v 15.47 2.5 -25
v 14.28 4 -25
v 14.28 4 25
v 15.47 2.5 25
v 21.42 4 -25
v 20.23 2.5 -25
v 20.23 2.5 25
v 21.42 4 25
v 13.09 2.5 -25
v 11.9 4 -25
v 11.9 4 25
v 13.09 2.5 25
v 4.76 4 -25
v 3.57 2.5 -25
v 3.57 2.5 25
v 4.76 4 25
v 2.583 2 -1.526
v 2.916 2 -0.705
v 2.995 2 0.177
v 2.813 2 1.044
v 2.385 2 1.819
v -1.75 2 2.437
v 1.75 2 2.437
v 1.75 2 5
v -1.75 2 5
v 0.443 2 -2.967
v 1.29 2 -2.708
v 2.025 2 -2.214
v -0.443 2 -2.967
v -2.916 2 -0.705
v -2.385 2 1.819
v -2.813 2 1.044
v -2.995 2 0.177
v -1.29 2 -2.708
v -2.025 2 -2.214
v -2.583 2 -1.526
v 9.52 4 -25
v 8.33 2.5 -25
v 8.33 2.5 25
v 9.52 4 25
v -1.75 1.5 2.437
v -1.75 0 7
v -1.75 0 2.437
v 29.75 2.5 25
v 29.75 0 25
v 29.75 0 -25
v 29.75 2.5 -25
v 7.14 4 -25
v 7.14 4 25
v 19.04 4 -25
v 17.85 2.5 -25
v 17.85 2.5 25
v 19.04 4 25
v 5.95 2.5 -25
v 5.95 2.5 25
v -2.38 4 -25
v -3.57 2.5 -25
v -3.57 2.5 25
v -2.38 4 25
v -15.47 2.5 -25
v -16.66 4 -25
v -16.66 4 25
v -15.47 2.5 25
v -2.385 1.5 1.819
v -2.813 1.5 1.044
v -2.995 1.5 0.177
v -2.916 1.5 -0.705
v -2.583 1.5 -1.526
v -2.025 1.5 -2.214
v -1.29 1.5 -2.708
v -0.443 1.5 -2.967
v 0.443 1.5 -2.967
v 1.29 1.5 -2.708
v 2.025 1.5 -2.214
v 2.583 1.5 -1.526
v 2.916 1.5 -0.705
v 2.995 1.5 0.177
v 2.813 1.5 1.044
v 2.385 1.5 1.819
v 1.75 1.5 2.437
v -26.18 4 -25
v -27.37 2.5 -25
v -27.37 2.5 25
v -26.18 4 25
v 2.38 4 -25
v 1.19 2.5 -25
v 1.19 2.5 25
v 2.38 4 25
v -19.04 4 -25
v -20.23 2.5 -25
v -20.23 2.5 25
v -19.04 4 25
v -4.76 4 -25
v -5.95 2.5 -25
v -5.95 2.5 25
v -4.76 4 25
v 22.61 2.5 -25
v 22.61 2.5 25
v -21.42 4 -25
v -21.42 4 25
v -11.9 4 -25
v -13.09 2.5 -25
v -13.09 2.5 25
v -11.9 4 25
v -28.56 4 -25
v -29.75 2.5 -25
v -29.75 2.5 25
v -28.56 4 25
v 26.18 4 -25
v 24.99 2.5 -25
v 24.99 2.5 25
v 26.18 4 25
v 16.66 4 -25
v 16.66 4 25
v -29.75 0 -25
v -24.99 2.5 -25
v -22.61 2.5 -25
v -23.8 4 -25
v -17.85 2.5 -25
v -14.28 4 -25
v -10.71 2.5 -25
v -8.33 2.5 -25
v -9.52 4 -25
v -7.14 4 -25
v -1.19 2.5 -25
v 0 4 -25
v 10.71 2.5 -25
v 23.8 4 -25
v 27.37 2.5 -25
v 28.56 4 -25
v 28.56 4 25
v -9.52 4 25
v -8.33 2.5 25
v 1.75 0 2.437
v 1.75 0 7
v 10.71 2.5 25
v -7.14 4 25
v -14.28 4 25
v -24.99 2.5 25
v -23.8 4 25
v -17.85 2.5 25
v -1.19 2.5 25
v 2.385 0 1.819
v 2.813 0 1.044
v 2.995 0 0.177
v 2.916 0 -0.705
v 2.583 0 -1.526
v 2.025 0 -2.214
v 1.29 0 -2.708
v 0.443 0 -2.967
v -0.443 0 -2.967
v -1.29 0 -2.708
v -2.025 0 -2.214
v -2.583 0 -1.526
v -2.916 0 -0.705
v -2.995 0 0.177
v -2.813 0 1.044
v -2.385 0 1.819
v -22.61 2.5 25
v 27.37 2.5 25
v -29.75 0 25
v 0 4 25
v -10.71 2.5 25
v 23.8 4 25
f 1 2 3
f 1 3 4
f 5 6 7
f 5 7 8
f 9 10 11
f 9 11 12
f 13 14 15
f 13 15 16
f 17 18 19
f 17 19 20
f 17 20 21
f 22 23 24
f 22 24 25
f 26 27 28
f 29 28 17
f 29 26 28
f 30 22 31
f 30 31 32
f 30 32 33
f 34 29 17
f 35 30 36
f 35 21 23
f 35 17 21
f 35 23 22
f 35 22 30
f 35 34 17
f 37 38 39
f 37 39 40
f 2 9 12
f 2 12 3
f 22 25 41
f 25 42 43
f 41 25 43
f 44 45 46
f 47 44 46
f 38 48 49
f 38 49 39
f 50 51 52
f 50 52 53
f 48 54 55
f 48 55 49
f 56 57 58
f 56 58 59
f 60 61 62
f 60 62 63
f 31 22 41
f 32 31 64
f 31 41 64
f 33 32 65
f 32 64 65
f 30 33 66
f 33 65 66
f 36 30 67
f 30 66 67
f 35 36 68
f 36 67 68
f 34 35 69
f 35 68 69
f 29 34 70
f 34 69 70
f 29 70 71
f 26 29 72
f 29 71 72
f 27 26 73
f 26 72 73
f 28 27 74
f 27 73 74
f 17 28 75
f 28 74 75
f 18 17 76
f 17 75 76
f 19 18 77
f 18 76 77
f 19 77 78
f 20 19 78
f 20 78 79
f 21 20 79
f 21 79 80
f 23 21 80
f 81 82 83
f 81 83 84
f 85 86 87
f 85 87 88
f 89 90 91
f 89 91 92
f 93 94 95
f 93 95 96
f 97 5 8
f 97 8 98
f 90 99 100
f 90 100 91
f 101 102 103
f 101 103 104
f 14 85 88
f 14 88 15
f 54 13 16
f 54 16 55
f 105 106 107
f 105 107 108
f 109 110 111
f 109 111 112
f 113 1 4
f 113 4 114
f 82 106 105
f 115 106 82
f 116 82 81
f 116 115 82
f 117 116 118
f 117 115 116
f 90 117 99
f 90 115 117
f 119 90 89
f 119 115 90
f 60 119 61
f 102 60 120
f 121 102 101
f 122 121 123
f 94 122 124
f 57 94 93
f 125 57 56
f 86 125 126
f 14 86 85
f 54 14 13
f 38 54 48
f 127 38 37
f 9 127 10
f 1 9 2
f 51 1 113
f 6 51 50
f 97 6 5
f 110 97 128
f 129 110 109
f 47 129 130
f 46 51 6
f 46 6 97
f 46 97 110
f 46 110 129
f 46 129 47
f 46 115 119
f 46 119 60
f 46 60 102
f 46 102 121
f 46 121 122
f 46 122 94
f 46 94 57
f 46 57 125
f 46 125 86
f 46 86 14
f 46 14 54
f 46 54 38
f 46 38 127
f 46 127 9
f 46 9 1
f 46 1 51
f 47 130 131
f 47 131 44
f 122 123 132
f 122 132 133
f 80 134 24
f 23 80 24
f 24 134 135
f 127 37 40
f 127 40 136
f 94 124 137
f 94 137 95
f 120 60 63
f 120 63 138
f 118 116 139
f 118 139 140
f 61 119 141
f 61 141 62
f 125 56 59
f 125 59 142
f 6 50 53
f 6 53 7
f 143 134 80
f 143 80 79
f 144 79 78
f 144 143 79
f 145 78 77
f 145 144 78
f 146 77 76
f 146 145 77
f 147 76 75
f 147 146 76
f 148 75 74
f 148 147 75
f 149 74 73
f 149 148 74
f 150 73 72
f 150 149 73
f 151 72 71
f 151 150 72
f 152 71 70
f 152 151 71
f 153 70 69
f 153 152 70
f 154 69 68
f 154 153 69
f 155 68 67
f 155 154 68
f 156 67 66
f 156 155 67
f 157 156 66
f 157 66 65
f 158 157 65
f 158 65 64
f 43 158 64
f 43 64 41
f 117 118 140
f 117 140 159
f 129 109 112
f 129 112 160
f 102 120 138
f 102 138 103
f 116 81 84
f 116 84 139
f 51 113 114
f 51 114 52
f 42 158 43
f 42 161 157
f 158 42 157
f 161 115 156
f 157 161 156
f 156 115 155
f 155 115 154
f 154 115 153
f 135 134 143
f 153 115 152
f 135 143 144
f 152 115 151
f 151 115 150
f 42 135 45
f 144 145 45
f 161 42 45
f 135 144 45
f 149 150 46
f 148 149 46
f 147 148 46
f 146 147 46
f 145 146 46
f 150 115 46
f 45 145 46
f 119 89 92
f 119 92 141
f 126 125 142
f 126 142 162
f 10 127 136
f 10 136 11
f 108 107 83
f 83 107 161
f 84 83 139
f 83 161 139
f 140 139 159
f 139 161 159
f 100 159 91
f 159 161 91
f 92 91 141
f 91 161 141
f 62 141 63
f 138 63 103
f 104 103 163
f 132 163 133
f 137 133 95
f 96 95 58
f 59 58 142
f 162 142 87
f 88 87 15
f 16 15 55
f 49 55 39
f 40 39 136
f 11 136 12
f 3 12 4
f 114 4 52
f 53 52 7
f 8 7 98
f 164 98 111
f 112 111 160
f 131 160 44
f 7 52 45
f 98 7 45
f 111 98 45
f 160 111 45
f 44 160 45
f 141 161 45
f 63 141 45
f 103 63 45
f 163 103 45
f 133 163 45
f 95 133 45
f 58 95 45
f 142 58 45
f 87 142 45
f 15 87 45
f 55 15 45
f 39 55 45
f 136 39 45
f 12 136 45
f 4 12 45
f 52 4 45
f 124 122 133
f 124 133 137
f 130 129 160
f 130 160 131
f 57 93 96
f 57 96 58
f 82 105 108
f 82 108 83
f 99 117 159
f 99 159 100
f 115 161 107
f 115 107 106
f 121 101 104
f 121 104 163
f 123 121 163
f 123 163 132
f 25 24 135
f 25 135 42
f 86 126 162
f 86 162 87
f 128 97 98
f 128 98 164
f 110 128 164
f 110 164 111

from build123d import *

# Parameters (mm, degrees)
SKETCH1_W           = 59.5
SKETCH1_H           = 50
SKETCH1_R           = 3
BOSS_EXTRUDE1_DEPTH = 1.5
BOSS_EXTRUDE2_DEPTH = 50
CUT_EXTRUDE1_DEPTH  = 2
CHAMFER1_SIZE       = 2


with BuildPart() as part:
    # Sketch1 → Boss-Extrude1 (new body)
    with BuildSketch(Plane(origin=(0, 0, 0), x_dir=(1, 0, 0), z_dir=(0, 1, 0))):
        Rectangle(SKETCH1_W, SKETCH1_H)
        with Locations(Location((0, 0, 0), (0, 0, 270))):
            Circle(SKETCH1_R, mode=Mode.SUBTRACT)
    extrude(amount=BOSS_EXTRUDE1_DEPTH)

    # Sketch2 → Boss-Extrude2 (add)
    with BuildSketch(Plane(origin=(0, 0, -25), x_dir=(-1, 0, 0), z_dir=(0, 0, -1))):
        Polygon((-29.75, 1.5), (29.75, 1.5), (29.75, 2.5), (28.56, 4), (27.37, 2.5), (26.18, 4), (24.99, 2.5), (23.8, 4), (22.61, 2.5), (21.42, 4), (20.23, 2.5), (19.04, 4), (17.85, 2.5), (16.66, 4), (15.47, 2.5), (14.28, 4), (13.09, 2.5), (11.9, 4), (10.71, 2.5), (9.52, 4), (8.33, 2.5), (7.14, 4), (5.95, 2.5), (4.76, 4), (3.57, 2.5), (2.38, 4), (1.19, 2.5), (0, 4), (-1.19, 2.5), (-2.38, 4), (-3.57, 2.5), (-4.76, 4), (-5.95, 2.5), (-7.14, 4), (-8.33, 2.5), (-9.52, 4), (-10.71, 2.5), (-11.9, 4), (-13.09, 2.5), (-14.28, 4), (-15.47, 2.5), (-16.66, 4), (-17.85, 2.5), (-19.04, 4), (-20.23, 2.5), (-21.42, 4), (-22.61, 2.5), (-23.8, 4), (-24.99, 2.5), (-26.18, 4), (-27.37, 2.5), (-28.56, 4), (-29.75, 2.5), align=None)
    extrude(amount=-BOSS_EXTRUDE2_DEPTH)

    # Sketch3 → Cut-Extrude1 (cut)
    with BuildSketch(Plane(origin=(0, 0, 0), x_dir=(-1, 0, 0), z_dir=(0, -1, 0))):
        with BuildLine():
            Line((-1.75, -2.436698586), (-1.75, -5))
            Line((-1.75, -5), (1.75, -5))
            Line((1.75, -5), (1.75, -2.436698586))
            ThreePointArc((1.75, -2.436698586), (0, 3), (-1.75, -2.436698586))
        make_face()
    extrude(amount=-CUT_EXTRUDE1_DEPTH, mode=Mode.SUBTRACT)

    # Chamfer1
    chamfer1_edges = [part.edges().sort_by_distance(p)[0] for p in [
        (0, 0, 5),
    ]]
    chamfer(chamfer1_edges, length=CHAMFER1_SIZE - 0.0001)  # a hair under: the kernel refuses the full size


solid = part.part
